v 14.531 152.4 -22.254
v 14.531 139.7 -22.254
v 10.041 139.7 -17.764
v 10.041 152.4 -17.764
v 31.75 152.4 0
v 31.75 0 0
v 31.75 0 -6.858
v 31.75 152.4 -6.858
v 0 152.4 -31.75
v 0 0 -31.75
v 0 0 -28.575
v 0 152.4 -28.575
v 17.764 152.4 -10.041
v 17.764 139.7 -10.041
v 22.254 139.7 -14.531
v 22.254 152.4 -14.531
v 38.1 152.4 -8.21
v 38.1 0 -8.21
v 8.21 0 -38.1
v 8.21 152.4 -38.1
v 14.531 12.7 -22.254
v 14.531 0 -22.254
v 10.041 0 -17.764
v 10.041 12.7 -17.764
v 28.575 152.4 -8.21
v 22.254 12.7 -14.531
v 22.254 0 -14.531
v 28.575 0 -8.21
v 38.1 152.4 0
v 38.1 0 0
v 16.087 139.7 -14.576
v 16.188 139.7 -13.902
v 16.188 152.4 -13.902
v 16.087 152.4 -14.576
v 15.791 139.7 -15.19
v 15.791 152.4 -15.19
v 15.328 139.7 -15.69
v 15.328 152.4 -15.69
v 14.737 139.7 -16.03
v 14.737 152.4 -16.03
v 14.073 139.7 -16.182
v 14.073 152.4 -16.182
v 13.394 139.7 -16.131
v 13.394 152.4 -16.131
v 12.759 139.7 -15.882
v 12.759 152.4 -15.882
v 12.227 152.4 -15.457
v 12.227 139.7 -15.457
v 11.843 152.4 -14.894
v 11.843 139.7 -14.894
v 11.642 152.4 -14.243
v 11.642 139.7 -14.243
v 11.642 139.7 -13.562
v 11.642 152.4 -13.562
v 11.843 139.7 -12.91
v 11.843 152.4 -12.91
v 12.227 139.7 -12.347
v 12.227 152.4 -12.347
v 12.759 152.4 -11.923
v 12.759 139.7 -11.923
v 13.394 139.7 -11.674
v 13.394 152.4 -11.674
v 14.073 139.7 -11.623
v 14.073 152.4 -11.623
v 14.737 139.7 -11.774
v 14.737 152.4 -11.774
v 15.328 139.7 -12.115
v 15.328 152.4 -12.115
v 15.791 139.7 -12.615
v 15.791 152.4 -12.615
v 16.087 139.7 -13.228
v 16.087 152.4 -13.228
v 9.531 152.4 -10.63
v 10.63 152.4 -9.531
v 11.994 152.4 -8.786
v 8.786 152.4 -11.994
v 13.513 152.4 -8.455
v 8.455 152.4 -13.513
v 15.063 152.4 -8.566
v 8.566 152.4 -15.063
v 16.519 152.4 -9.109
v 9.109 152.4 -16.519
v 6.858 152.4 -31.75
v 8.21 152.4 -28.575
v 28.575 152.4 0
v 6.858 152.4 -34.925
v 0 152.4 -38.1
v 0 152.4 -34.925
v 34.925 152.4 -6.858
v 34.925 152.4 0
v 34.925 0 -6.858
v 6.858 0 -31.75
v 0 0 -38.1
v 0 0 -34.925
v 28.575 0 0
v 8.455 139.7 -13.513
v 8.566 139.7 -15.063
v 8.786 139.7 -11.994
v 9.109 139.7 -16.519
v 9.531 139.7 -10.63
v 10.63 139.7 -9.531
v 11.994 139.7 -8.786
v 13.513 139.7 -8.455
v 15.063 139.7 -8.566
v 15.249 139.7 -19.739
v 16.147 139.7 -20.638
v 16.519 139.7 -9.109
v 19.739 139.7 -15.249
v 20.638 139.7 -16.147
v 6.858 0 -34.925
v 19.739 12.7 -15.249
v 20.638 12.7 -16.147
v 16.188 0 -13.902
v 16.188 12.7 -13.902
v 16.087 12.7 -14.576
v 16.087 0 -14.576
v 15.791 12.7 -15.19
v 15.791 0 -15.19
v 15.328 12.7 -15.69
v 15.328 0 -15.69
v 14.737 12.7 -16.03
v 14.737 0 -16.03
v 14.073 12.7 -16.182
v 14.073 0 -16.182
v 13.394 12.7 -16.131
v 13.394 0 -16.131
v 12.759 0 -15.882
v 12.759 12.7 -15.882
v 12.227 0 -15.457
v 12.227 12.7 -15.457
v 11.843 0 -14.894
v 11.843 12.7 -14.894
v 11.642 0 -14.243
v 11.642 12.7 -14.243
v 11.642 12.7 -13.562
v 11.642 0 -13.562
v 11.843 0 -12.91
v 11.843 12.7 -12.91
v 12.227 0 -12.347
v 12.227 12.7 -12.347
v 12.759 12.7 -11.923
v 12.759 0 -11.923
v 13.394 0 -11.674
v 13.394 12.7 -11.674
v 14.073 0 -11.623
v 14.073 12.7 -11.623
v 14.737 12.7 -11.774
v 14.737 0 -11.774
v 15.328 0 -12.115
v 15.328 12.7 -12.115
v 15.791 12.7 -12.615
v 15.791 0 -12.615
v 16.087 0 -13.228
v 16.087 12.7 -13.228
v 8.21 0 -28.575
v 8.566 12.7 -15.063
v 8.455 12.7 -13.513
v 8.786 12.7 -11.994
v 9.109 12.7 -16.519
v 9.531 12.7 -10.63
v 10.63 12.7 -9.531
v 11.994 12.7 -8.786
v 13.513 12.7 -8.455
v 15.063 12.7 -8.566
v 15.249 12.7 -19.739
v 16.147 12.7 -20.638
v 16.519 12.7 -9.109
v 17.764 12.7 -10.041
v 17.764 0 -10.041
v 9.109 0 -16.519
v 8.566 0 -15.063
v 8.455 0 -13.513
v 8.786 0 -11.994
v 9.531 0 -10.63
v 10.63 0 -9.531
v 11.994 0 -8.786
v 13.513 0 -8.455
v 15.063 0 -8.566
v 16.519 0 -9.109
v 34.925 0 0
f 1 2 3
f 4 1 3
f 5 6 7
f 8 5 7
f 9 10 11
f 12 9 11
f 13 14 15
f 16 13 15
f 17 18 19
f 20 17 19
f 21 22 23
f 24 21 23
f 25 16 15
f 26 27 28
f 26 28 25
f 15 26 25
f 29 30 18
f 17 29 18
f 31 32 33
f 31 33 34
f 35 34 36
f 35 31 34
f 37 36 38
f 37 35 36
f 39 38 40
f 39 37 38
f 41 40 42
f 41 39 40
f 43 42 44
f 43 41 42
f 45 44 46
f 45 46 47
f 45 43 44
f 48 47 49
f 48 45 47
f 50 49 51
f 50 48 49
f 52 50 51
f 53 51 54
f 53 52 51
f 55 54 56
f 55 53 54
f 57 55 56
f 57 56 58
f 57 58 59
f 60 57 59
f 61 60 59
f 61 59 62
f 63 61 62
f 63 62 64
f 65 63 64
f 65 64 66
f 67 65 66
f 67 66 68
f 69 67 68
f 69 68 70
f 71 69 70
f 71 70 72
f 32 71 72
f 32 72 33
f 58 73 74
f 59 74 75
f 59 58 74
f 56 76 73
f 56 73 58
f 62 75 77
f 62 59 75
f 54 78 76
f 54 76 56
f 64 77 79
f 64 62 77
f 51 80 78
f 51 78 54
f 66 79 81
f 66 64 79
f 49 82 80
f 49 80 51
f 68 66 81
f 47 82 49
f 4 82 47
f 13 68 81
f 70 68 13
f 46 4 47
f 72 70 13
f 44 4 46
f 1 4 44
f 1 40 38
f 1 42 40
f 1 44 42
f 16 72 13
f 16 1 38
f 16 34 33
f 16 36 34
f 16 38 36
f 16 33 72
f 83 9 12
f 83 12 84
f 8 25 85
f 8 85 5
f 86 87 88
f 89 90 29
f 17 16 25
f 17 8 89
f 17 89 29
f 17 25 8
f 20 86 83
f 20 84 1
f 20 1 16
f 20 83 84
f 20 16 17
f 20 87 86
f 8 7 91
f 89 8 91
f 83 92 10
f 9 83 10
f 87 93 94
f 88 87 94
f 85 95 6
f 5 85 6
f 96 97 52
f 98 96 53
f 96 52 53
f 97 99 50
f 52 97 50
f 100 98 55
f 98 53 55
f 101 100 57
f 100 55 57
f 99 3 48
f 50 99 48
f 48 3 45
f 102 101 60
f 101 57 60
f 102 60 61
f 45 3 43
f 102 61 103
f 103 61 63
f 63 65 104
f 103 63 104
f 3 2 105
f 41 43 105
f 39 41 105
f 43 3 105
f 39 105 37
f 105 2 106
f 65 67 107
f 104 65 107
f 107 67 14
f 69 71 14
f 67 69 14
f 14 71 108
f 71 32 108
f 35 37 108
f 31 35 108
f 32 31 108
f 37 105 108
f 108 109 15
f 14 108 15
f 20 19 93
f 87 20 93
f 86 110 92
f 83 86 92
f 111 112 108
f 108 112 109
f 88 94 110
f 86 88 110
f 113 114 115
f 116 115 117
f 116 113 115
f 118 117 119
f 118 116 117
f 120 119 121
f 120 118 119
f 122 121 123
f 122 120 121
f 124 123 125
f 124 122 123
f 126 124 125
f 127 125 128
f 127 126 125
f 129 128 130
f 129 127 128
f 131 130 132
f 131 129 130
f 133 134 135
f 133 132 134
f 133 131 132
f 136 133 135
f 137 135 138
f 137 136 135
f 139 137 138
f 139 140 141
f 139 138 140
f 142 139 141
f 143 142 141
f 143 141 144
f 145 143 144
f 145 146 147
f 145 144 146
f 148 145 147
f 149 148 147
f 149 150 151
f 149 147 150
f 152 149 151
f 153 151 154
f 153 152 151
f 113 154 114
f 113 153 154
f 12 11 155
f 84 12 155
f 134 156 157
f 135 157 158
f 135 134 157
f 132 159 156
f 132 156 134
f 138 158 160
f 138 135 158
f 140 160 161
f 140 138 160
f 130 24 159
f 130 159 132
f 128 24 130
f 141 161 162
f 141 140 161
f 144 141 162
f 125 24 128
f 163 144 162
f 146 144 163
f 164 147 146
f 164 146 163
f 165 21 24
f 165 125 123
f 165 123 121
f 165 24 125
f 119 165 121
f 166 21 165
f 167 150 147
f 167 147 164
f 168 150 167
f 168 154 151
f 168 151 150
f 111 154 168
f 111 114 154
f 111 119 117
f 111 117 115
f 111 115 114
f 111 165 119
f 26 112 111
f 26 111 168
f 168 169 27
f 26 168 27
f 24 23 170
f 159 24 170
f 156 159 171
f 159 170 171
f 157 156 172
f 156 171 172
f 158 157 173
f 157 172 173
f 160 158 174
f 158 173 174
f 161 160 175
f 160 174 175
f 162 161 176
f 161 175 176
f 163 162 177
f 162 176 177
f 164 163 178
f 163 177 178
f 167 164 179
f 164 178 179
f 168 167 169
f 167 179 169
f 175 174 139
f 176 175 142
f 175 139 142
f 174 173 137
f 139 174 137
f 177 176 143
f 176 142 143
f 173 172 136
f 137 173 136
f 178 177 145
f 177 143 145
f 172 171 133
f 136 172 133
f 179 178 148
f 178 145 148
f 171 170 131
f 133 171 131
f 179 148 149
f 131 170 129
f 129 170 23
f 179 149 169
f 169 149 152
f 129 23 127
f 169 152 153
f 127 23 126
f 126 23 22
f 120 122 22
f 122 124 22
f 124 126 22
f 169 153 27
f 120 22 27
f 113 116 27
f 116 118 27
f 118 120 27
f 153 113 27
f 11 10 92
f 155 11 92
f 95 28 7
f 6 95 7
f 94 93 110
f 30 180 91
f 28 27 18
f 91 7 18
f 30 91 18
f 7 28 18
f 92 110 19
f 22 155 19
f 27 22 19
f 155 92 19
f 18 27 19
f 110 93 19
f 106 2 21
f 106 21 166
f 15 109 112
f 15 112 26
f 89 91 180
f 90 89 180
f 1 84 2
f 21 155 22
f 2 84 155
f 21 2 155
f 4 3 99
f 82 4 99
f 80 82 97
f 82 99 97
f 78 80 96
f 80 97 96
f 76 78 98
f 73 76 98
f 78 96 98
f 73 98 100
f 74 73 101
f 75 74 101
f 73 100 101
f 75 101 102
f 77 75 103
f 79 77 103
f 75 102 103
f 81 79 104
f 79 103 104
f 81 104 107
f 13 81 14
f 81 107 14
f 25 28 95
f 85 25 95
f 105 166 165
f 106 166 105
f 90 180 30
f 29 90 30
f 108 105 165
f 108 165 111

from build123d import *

# Parameters (mm, degrees)
SKETCH1_R           = 2.286
BOSS_EXTRUDE1_DEPTH = 152.4
SKETCH2_W           = 10.922
SKETCH2_H           = 127
CUT_EXTRUDE1_DEPTH  = 11.811
SKETCH3_W           = 6.35
SKETCH3_H           = 127
BOSS_EXTRUDE2_DEPTH = 1.27


with BuildPart() as part:
    # Sketch1 → Boss-Extrude1 (new body)
    with BuildSketch(Plane(origin=(0, 0, 0), x_dir=(1, 0, 0), z_dir=(0, 1, 0))):
        with BuildLine():
            Line((38.1, 0), (38.1, 8.209871939))
            Line((38.1, 8.209871939), (8.209871939, 38.1))
            Line((8.209871939, 38.1), (0, 38.1))
            Line((0, 38.1), (0, 34.925))
            Line((0, 34.925), (6.858, 34.925))
            Line((6.858, 34.925), (6.858, 31.75))
            Line((6.858, 31.75), (0, 31.75))
            Line((0, 31.75), (0, 28.575))
            Line((0, 28.575), (8.209871939, 28.575))
            Line((8.209871939, 28.575), (14.530925838, 22.253946102))
            Line((14.530925838, 22.253946102), (10.040797777, 17.763818041))
            ThreePointArc((10.040797777, 17.763818041), (10.040797777, 10.040797777), (17.763818041, 10.040797777))
            Line((17.763818041, 10.040797777), (22.253946102, 14.530925838))
            Line((22.253946102, 14.530925838), (28.575, 8.209871939))
            Line((28.575, 8.209871939), (28.575, 0))
            Line((28.575, 0), (31.75, 0))
            Line((31.75, 0), (31.75, 6.858))
            Line((31.75, 6.858), (34.925, 6.858))
            Line((34.925, 6.858), (34.925, 0))
            Line((34.925, 0), (38.1, 0))
        make_face()
        with Locations((13.902307909, 13.902307909)):
            Circle(SKETCH1_R, mode=Mode.SUBTRACT)
    extrude(amount=BOSS_EXTRUDE1_DEPTH)

    # Sketch2 → Cut-Extrude1 (cut)
    with BuildSketch(Plane(origin=(18.39243597, 0, -18.39243597), x_dir=(0.707106781, 0, 0.707106781), z_dir=(-0.707106781, 0, 0.707106781))):
        with Locations((0, 76.2)):
            Rectangle(SKETCH2_W, SKETCH2_H)
    extrude(amount=CUT_EXTRUDE1_DEPTH, mode=Mode.SUBTRACT)

    # Sketch3 → Boss-Extrude2 (add)
    with BuildSketch(Plane(origin=(18.39243597, 0, -18.39243597), x_dir=(0.707106781, 0, 0.707106781), z_dir=(-0.707106781, 0, 0.707106781))):
        with Locations((0, 76.2)):
            Rectangle(SKETCH3_W, SKETCH3_H)
    extrude(amount=BOSS_EXTRUDE2_DEPTH)


solid = part.part
